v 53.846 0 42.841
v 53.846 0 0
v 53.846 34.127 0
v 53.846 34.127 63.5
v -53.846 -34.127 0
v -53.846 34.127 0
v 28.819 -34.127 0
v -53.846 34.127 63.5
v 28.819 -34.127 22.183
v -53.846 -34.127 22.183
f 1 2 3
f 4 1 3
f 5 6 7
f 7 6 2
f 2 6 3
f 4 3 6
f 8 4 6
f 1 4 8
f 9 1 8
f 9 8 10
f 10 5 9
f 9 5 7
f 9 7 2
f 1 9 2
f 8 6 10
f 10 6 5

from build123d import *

# Parameters (mm, degrees)
F1_DEPTH = 63.5
F3_DEPTH = 107.692191


with BuildPart() as f1:
    # F0 (on Top) → F1 (new body)
    with BuildSketch(Plane.XY):
        Polygon((53.845596, 0), (53.845596, 34.127489), (-53.845596, 34.127489), (-53.845596, -34.127489), (28.818766, -34.127489), align=None)
    extrude(amount=F1_DEPTH)

    # F2 (on face) → F3 (cut, through all)
    with BuildSketch(Plane(origin=(-53.845596, 0, 0), x_dir=(0, -1, 0), z_dir=(-1, 0, 0))):
        Polygon((34.127489, 63.5), (-34.127489, 63.5), (34.127489, 22.182867), align=None)
    extrude(amount=-F3_DEPTH, mode=Mode.SUBTRACT)


solid = f1.part
